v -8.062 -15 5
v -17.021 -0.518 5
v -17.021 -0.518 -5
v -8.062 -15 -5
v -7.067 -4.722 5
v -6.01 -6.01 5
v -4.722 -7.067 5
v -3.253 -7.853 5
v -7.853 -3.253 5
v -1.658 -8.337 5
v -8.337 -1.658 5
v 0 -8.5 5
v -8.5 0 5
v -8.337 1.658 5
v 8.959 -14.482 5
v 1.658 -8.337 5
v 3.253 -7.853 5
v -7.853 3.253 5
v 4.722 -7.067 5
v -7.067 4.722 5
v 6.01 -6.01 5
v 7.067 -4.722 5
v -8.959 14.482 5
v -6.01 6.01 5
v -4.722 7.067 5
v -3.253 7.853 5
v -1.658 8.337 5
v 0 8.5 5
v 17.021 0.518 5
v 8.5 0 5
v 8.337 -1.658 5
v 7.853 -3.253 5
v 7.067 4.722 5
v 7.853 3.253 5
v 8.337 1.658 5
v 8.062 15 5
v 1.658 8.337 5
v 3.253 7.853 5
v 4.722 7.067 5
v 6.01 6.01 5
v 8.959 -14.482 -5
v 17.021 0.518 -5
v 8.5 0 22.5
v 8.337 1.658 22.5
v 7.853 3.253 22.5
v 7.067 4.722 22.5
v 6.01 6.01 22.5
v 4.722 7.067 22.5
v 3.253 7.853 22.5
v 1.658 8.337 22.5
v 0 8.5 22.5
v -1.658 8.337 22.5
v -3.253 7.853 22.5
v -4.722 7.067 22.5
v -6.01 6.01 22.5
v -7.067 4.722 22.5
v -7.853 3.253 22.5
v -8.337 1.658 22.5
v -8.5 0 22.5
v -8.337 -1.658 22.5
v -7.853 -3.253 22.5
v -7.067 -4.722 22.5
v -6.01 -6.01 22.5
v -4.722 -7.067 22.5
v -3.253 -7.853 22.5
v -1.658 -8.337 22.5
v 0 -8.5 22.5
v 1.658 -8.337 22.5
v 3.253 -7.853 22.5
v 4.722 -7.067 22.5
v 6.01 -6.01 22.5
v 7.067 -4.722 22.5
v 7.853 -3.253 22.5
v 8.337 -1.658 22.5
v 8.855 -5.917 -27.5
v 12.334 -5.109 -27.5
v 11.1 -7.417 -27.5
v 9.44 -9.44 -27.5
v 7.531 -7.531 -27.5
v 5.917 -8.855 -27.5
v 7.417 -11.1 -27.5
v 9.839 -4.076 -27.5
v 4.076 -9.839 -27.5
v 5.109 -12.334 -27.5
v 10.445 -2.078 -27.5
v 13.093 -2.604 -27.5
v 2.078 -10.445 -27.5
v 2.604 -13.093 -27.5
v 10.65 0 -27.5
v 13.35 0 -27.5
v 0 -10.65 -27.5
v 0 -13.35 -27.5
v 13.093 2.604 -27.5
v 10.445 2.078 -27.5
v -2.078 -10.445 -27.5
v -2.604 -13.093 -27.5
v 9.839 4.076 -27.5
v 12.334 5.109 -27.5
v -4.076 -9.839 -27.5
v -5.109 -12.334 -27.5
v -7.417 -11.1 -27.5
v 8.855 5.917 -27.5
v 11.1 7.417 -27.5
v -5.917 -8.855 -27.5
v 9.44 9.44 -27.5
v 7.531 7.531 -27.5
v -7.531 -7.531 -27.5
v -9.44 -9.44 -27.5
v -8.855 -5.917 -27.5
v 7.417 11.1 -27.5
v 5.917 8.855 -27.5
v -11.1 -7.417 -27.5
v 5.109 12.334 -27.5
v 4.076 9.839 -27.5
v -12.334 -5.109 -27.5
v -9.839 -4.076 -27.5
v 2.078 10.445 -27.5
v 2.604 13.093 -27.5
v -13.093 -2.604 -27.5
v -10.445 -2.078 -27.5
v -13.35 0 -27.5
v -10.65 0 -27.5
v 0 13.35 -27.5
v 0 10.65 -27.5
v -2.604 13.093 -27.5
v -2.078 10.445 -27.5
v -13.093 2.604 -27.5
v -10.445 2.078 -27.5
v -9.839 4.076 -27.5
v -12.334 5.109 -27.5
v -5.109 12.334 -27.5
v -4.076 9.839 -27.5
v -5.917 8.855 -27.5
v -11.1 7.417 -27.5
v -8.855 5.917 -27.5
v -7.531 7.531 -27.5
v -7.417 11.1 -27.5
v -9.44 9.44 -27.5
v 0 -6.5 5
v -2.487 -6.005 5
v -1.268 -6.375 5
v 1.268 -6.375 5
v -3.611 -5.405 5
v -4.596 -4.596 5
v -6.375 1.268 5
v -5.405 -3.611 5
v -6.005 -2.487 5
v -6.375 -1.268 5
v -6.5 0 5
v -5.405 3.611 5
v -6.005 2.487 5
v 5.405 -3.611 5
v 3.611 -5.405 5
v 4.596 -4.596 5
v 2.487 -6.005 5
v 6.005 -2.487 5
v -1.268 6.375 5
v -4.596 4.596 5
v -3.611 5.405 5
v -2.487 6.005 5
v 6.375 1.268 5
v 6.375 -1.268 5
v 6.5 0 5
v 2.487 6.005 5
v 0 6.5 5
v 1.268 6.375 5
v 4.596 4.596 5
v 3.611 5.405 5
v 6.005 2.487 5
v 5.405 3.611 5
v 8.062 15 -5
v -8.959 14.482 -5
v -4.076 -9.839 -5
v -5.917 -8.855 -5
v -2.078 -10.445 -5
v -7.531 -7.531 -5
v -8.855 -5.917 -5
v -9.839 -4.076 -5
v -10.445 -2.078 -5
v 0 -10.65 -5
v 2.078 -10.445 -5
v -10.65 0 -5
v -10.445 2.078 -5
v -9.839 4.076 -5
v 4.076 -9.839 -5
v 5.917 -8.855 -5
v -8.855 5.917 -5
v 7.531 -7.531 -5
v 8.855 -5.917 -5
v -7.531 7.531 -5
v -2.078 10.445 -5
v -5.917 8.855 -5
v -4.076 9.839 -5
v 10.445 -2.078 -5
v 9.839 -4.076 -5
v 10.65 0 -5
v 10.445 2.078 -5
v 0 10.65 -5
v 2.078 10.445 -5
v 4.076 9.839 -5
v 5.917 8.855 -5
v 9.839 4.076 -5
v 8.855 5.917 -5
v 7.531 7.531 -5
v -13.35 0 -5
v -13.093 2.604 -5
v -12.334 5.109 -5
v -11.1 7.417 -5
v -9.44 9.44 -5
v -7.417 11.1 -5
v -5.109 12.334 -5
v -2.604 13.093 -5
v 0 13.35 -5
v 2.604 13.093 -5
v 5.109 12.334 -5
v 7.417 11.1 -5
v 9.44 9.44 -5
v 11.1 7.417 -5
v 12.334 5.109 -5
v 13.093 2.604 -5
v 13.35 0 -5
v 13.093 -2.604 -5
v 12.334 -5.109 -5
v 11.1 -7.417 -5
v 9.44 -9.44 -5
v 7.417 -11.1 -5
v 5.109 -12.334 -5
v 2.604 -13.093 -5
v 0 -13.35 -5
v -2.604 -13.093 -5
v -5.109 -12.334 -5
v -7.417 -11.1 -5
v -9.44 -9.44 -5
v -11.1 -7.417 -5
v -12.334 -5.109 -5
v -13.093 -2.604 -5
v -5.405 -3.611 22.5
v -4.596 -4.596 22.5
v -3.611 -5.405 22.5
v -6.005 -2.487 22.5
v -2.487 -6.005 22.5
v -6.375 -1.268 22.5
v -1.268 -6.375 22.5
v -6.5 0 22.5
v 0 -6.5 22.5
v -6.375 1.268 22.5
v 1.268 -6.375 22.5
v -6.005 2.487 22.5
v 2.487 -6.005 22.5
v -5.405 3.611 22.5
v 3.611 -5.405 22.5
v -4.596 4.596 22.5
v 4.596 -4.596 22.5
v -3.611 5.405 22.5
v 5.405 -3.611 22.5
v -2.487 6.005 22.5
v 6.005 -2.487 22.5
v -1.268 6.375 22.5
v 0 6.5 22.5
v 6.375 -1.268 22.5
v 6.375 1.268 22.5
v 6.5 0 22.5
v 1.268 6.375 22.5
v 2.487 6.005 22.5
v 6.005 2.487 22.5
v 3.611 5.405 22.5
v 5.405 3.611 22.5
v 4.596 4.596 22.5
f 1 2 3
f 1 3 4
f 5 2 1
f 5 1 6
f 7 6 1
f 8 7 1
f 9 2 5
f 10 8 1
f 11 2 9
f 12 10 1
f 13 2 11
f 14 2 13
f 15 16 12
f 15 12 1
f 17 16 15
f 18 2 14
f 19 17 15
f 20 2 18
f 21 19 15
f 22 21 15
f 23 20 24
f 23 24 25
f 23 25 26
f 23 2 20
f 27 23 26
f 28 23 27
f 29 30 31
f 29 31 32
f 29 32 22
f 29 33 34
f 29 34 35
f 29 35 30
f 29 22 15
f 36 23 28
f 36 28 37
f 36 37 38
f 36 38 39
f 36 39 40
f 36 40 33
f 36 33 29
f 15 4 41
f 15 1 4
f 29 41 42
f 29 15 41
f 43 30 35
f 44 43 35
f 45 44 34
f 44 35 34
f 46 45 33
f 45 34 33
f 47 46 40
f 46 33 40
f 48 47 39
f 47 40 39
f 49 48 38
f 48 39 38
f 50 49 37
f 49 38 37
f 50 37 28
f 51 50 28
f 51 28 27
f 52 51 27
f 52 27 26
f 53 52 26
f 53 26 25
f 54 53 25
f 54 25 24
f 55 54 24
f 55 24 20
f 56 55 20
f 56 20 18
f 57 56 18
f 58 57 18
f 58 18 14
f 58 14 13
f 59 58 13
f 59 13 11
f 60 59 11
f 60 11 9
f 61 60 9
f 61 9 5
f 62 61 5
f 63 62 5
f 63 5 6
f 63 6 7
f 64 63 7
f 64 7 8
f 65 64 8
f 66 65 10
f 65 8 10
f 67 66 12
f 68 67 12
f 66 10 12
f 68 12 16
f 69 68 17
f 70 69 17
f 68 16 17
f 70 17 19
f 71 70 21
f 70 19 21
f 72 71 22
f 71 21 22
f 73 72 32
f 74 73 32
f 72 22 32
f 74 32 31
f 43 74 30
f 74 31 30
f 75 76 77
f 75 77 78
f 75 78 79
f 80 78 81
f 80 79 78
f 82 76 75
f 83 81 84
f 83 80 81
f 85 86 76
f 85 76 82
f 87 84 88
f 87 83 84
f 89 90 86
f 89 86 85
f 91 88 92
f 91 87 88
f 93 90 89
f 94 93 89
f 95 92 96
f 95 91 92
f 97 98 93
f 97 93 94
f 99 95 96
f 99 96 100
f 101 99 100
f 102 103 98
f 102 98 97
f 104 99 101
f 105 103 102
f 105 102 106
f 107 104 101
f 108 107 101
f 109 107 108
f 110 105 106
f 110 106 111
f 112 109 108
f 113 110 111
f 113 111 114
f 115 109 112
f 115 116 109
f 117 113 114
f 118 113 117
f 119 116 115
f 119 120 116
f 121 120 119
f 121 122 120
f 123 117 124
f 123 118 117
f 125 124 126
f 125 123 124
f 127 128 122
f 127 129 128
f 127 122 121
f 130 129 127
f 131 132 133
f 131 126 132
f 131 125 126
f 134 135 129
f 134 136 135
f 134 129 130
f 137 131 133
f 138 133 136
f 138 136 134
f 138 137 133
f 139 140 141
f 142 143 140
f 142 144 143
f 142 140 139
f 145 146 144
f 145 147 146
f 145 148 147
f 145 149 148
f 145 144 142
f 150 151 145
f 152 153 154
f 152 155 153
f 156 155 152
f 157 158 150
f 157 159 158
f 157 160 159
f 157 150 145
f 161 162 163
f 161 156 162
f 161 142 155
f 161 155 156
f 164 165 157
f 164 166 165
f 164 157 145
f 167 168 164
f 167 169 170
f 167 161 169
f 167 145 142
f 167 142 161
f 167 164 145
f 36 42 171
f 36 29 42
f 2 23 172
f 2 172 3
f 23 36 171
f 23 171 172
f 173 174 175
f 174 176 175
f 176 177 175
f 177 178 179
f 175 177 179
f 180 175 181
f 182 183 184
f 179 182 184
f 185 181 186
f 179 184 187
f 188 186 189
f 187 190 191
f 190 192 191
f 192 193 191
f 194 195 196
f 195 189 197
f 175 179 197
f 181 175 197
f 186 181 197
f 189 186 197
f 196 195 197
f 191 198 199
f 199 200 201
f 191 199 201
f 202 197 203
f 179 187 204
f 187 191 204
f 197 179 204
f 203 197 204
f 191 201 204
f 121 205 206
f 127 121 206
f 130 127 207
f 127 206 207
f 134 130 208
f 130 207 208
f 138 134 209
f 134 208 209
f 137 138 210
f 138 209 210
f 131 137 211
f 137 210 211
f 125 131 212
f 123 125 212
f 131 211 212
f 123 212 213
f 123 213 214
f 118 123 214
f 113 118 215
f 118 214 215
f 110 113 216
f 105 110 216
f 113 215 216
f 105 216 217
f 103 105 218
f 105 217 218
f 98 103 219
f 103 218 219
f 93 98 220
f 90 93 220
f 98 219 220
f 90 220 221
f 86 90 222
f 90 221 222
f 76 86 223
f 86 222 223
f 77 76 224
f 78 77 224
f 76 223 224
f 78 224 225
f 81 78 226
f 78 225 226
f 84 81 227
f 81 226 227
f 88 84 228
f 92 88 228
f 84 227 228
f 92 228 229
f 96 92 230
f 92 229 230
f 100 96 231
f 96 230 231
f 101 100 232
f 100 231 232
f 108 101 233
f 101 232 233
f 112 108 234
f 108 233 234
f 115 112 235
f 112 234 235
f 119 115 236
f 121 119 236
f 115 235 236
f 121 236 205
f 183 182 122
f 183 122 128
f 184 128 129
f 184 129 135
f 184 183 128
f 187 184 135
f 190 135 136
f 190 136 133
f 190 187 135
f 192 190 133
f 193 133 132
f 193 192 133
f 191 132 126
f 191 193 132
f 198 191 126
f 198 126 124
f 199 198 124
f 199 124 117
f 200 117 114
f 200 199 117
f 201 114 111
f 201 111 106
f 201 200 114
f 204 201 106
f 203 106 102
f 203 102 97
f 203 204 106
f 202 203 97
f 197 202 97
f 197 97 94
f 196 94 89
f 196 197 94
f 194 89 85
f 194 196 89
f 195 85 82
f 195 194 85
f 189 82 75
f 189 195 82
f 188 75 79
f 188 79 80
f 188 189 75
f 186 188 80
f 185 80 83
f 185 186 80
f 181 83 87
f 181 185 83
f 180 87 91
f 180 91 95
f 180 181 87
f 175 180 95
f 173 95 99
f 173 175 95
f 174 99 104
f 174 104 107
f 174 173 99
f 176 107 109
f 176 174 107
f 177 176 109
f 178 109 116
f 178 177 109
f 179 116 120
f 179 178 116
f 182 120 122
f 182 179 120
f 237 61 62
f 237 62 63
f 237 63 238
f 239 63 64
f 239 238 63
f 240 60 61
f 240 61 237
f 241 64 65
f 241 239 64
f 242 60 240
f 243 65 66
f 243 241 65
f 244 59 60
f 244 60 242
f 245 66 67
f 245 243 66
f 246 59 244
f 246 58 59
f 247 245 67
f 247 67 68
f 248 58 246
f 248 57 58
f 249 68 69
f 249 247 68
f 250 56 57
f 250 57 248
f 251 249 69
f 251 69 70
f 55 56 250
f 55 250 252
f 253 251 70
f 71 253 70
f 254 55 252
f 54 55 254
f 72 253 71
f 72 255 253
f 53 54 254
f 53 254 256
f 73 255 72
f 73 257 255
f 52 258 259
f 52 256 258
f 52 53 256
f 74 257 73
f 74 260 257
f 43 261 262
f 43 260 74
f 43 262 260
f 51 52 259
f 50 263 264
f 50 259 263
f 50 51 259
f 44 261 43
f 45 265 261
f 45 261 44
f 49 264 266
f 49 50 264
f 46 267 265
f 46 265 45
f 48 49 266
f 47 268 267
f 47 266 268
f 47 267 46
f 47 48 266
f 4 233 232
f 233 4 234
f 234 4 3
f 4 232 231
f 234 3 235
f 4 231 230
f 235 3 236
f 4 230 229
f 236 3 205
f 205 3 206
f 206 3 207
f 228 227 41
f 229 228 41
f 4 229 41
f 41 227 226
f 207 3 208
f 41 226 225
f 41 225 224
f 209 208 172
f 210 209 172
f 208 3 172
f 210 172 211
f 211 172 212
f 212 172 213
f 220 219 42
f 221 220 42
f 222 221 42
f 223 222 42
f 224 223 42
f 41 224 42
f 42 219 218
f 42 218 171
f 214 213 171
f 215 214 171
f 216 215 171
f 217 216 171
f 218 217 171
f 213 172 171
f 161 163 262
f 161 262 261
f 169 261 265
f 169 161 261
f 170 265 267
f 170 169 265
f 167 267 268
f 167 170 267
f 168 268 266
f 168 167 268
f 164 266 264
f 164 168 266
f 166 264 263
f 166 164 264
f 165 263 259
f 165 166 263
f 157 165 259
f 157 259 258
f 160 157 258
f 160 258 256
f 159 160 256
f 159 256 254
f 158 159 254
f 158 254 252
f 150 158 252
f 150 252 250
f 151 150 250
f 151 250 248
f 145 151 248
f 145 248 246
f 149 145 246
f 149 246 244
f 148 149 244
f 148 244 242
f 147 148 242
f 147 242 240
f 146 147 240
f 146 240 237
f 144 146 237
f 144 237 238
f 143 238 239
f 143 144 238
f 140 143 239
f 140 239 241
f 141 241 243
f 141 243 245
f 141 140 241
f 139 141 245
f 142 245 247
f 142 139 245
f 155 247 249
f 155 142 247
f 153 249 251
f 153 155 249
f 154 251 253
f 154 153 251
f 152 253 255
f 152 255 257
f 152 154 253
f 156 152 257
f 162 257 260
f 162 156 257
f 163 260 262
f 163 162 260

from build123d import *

# Parameters (mm, degrees)
SKETCH1_R           = 8.5
SKETCH1_R_2         = 6.5
EXTRUDE_THIN1_DEPTH = 22.5
BOSS_EXTRUDE1_DEPTH = 5
SKETCH3_R           = 13.35
SKETCH3_R_2         = 10.65
EXTRUDE_THIN2_DEPTH = 22.5


with BuildPart() as part:
    # Sketch1 → Extrude-Thin1 (new body)
    with BuildSketch(Plane.XY):
        Circle(SKETCH1_R)
        Circle(SKETCH1_R_2, mode=Mode.SUBTRACT)
    extrude(amount=EXTRUDE_THIN1_DEPTH)

    # Sketch2 → Boss-Extrude1 (add, symmetric)
    with BuildSketch(Plane.XY):
        Polygon((17.021487729, 0.517918433), (8.062213344, 15), (-8.959274385, 14.482081567), (-17.021487729, -0.517918433), (-8.062213344, -15), (8.959274385, -14.482081567), align=None)
    extrude(amount=BOSS_EXTRUDE1_DEPTH, both=True)

    # Sketch3 → Extrude-Thin2 (add)
    with BuildSketch(Plane(origin=(0, 0, -5), x_dir=(-1, 0, 0), z_dir=(0, 0, -1))):
        Circle(SKETCH3_R)
        Circle(SKETCH3_R_2, mode=Mode.SUBTRACT)
    extrude(amount=EXTRUDE_THIN2_DEPTH)


solid = part.part
